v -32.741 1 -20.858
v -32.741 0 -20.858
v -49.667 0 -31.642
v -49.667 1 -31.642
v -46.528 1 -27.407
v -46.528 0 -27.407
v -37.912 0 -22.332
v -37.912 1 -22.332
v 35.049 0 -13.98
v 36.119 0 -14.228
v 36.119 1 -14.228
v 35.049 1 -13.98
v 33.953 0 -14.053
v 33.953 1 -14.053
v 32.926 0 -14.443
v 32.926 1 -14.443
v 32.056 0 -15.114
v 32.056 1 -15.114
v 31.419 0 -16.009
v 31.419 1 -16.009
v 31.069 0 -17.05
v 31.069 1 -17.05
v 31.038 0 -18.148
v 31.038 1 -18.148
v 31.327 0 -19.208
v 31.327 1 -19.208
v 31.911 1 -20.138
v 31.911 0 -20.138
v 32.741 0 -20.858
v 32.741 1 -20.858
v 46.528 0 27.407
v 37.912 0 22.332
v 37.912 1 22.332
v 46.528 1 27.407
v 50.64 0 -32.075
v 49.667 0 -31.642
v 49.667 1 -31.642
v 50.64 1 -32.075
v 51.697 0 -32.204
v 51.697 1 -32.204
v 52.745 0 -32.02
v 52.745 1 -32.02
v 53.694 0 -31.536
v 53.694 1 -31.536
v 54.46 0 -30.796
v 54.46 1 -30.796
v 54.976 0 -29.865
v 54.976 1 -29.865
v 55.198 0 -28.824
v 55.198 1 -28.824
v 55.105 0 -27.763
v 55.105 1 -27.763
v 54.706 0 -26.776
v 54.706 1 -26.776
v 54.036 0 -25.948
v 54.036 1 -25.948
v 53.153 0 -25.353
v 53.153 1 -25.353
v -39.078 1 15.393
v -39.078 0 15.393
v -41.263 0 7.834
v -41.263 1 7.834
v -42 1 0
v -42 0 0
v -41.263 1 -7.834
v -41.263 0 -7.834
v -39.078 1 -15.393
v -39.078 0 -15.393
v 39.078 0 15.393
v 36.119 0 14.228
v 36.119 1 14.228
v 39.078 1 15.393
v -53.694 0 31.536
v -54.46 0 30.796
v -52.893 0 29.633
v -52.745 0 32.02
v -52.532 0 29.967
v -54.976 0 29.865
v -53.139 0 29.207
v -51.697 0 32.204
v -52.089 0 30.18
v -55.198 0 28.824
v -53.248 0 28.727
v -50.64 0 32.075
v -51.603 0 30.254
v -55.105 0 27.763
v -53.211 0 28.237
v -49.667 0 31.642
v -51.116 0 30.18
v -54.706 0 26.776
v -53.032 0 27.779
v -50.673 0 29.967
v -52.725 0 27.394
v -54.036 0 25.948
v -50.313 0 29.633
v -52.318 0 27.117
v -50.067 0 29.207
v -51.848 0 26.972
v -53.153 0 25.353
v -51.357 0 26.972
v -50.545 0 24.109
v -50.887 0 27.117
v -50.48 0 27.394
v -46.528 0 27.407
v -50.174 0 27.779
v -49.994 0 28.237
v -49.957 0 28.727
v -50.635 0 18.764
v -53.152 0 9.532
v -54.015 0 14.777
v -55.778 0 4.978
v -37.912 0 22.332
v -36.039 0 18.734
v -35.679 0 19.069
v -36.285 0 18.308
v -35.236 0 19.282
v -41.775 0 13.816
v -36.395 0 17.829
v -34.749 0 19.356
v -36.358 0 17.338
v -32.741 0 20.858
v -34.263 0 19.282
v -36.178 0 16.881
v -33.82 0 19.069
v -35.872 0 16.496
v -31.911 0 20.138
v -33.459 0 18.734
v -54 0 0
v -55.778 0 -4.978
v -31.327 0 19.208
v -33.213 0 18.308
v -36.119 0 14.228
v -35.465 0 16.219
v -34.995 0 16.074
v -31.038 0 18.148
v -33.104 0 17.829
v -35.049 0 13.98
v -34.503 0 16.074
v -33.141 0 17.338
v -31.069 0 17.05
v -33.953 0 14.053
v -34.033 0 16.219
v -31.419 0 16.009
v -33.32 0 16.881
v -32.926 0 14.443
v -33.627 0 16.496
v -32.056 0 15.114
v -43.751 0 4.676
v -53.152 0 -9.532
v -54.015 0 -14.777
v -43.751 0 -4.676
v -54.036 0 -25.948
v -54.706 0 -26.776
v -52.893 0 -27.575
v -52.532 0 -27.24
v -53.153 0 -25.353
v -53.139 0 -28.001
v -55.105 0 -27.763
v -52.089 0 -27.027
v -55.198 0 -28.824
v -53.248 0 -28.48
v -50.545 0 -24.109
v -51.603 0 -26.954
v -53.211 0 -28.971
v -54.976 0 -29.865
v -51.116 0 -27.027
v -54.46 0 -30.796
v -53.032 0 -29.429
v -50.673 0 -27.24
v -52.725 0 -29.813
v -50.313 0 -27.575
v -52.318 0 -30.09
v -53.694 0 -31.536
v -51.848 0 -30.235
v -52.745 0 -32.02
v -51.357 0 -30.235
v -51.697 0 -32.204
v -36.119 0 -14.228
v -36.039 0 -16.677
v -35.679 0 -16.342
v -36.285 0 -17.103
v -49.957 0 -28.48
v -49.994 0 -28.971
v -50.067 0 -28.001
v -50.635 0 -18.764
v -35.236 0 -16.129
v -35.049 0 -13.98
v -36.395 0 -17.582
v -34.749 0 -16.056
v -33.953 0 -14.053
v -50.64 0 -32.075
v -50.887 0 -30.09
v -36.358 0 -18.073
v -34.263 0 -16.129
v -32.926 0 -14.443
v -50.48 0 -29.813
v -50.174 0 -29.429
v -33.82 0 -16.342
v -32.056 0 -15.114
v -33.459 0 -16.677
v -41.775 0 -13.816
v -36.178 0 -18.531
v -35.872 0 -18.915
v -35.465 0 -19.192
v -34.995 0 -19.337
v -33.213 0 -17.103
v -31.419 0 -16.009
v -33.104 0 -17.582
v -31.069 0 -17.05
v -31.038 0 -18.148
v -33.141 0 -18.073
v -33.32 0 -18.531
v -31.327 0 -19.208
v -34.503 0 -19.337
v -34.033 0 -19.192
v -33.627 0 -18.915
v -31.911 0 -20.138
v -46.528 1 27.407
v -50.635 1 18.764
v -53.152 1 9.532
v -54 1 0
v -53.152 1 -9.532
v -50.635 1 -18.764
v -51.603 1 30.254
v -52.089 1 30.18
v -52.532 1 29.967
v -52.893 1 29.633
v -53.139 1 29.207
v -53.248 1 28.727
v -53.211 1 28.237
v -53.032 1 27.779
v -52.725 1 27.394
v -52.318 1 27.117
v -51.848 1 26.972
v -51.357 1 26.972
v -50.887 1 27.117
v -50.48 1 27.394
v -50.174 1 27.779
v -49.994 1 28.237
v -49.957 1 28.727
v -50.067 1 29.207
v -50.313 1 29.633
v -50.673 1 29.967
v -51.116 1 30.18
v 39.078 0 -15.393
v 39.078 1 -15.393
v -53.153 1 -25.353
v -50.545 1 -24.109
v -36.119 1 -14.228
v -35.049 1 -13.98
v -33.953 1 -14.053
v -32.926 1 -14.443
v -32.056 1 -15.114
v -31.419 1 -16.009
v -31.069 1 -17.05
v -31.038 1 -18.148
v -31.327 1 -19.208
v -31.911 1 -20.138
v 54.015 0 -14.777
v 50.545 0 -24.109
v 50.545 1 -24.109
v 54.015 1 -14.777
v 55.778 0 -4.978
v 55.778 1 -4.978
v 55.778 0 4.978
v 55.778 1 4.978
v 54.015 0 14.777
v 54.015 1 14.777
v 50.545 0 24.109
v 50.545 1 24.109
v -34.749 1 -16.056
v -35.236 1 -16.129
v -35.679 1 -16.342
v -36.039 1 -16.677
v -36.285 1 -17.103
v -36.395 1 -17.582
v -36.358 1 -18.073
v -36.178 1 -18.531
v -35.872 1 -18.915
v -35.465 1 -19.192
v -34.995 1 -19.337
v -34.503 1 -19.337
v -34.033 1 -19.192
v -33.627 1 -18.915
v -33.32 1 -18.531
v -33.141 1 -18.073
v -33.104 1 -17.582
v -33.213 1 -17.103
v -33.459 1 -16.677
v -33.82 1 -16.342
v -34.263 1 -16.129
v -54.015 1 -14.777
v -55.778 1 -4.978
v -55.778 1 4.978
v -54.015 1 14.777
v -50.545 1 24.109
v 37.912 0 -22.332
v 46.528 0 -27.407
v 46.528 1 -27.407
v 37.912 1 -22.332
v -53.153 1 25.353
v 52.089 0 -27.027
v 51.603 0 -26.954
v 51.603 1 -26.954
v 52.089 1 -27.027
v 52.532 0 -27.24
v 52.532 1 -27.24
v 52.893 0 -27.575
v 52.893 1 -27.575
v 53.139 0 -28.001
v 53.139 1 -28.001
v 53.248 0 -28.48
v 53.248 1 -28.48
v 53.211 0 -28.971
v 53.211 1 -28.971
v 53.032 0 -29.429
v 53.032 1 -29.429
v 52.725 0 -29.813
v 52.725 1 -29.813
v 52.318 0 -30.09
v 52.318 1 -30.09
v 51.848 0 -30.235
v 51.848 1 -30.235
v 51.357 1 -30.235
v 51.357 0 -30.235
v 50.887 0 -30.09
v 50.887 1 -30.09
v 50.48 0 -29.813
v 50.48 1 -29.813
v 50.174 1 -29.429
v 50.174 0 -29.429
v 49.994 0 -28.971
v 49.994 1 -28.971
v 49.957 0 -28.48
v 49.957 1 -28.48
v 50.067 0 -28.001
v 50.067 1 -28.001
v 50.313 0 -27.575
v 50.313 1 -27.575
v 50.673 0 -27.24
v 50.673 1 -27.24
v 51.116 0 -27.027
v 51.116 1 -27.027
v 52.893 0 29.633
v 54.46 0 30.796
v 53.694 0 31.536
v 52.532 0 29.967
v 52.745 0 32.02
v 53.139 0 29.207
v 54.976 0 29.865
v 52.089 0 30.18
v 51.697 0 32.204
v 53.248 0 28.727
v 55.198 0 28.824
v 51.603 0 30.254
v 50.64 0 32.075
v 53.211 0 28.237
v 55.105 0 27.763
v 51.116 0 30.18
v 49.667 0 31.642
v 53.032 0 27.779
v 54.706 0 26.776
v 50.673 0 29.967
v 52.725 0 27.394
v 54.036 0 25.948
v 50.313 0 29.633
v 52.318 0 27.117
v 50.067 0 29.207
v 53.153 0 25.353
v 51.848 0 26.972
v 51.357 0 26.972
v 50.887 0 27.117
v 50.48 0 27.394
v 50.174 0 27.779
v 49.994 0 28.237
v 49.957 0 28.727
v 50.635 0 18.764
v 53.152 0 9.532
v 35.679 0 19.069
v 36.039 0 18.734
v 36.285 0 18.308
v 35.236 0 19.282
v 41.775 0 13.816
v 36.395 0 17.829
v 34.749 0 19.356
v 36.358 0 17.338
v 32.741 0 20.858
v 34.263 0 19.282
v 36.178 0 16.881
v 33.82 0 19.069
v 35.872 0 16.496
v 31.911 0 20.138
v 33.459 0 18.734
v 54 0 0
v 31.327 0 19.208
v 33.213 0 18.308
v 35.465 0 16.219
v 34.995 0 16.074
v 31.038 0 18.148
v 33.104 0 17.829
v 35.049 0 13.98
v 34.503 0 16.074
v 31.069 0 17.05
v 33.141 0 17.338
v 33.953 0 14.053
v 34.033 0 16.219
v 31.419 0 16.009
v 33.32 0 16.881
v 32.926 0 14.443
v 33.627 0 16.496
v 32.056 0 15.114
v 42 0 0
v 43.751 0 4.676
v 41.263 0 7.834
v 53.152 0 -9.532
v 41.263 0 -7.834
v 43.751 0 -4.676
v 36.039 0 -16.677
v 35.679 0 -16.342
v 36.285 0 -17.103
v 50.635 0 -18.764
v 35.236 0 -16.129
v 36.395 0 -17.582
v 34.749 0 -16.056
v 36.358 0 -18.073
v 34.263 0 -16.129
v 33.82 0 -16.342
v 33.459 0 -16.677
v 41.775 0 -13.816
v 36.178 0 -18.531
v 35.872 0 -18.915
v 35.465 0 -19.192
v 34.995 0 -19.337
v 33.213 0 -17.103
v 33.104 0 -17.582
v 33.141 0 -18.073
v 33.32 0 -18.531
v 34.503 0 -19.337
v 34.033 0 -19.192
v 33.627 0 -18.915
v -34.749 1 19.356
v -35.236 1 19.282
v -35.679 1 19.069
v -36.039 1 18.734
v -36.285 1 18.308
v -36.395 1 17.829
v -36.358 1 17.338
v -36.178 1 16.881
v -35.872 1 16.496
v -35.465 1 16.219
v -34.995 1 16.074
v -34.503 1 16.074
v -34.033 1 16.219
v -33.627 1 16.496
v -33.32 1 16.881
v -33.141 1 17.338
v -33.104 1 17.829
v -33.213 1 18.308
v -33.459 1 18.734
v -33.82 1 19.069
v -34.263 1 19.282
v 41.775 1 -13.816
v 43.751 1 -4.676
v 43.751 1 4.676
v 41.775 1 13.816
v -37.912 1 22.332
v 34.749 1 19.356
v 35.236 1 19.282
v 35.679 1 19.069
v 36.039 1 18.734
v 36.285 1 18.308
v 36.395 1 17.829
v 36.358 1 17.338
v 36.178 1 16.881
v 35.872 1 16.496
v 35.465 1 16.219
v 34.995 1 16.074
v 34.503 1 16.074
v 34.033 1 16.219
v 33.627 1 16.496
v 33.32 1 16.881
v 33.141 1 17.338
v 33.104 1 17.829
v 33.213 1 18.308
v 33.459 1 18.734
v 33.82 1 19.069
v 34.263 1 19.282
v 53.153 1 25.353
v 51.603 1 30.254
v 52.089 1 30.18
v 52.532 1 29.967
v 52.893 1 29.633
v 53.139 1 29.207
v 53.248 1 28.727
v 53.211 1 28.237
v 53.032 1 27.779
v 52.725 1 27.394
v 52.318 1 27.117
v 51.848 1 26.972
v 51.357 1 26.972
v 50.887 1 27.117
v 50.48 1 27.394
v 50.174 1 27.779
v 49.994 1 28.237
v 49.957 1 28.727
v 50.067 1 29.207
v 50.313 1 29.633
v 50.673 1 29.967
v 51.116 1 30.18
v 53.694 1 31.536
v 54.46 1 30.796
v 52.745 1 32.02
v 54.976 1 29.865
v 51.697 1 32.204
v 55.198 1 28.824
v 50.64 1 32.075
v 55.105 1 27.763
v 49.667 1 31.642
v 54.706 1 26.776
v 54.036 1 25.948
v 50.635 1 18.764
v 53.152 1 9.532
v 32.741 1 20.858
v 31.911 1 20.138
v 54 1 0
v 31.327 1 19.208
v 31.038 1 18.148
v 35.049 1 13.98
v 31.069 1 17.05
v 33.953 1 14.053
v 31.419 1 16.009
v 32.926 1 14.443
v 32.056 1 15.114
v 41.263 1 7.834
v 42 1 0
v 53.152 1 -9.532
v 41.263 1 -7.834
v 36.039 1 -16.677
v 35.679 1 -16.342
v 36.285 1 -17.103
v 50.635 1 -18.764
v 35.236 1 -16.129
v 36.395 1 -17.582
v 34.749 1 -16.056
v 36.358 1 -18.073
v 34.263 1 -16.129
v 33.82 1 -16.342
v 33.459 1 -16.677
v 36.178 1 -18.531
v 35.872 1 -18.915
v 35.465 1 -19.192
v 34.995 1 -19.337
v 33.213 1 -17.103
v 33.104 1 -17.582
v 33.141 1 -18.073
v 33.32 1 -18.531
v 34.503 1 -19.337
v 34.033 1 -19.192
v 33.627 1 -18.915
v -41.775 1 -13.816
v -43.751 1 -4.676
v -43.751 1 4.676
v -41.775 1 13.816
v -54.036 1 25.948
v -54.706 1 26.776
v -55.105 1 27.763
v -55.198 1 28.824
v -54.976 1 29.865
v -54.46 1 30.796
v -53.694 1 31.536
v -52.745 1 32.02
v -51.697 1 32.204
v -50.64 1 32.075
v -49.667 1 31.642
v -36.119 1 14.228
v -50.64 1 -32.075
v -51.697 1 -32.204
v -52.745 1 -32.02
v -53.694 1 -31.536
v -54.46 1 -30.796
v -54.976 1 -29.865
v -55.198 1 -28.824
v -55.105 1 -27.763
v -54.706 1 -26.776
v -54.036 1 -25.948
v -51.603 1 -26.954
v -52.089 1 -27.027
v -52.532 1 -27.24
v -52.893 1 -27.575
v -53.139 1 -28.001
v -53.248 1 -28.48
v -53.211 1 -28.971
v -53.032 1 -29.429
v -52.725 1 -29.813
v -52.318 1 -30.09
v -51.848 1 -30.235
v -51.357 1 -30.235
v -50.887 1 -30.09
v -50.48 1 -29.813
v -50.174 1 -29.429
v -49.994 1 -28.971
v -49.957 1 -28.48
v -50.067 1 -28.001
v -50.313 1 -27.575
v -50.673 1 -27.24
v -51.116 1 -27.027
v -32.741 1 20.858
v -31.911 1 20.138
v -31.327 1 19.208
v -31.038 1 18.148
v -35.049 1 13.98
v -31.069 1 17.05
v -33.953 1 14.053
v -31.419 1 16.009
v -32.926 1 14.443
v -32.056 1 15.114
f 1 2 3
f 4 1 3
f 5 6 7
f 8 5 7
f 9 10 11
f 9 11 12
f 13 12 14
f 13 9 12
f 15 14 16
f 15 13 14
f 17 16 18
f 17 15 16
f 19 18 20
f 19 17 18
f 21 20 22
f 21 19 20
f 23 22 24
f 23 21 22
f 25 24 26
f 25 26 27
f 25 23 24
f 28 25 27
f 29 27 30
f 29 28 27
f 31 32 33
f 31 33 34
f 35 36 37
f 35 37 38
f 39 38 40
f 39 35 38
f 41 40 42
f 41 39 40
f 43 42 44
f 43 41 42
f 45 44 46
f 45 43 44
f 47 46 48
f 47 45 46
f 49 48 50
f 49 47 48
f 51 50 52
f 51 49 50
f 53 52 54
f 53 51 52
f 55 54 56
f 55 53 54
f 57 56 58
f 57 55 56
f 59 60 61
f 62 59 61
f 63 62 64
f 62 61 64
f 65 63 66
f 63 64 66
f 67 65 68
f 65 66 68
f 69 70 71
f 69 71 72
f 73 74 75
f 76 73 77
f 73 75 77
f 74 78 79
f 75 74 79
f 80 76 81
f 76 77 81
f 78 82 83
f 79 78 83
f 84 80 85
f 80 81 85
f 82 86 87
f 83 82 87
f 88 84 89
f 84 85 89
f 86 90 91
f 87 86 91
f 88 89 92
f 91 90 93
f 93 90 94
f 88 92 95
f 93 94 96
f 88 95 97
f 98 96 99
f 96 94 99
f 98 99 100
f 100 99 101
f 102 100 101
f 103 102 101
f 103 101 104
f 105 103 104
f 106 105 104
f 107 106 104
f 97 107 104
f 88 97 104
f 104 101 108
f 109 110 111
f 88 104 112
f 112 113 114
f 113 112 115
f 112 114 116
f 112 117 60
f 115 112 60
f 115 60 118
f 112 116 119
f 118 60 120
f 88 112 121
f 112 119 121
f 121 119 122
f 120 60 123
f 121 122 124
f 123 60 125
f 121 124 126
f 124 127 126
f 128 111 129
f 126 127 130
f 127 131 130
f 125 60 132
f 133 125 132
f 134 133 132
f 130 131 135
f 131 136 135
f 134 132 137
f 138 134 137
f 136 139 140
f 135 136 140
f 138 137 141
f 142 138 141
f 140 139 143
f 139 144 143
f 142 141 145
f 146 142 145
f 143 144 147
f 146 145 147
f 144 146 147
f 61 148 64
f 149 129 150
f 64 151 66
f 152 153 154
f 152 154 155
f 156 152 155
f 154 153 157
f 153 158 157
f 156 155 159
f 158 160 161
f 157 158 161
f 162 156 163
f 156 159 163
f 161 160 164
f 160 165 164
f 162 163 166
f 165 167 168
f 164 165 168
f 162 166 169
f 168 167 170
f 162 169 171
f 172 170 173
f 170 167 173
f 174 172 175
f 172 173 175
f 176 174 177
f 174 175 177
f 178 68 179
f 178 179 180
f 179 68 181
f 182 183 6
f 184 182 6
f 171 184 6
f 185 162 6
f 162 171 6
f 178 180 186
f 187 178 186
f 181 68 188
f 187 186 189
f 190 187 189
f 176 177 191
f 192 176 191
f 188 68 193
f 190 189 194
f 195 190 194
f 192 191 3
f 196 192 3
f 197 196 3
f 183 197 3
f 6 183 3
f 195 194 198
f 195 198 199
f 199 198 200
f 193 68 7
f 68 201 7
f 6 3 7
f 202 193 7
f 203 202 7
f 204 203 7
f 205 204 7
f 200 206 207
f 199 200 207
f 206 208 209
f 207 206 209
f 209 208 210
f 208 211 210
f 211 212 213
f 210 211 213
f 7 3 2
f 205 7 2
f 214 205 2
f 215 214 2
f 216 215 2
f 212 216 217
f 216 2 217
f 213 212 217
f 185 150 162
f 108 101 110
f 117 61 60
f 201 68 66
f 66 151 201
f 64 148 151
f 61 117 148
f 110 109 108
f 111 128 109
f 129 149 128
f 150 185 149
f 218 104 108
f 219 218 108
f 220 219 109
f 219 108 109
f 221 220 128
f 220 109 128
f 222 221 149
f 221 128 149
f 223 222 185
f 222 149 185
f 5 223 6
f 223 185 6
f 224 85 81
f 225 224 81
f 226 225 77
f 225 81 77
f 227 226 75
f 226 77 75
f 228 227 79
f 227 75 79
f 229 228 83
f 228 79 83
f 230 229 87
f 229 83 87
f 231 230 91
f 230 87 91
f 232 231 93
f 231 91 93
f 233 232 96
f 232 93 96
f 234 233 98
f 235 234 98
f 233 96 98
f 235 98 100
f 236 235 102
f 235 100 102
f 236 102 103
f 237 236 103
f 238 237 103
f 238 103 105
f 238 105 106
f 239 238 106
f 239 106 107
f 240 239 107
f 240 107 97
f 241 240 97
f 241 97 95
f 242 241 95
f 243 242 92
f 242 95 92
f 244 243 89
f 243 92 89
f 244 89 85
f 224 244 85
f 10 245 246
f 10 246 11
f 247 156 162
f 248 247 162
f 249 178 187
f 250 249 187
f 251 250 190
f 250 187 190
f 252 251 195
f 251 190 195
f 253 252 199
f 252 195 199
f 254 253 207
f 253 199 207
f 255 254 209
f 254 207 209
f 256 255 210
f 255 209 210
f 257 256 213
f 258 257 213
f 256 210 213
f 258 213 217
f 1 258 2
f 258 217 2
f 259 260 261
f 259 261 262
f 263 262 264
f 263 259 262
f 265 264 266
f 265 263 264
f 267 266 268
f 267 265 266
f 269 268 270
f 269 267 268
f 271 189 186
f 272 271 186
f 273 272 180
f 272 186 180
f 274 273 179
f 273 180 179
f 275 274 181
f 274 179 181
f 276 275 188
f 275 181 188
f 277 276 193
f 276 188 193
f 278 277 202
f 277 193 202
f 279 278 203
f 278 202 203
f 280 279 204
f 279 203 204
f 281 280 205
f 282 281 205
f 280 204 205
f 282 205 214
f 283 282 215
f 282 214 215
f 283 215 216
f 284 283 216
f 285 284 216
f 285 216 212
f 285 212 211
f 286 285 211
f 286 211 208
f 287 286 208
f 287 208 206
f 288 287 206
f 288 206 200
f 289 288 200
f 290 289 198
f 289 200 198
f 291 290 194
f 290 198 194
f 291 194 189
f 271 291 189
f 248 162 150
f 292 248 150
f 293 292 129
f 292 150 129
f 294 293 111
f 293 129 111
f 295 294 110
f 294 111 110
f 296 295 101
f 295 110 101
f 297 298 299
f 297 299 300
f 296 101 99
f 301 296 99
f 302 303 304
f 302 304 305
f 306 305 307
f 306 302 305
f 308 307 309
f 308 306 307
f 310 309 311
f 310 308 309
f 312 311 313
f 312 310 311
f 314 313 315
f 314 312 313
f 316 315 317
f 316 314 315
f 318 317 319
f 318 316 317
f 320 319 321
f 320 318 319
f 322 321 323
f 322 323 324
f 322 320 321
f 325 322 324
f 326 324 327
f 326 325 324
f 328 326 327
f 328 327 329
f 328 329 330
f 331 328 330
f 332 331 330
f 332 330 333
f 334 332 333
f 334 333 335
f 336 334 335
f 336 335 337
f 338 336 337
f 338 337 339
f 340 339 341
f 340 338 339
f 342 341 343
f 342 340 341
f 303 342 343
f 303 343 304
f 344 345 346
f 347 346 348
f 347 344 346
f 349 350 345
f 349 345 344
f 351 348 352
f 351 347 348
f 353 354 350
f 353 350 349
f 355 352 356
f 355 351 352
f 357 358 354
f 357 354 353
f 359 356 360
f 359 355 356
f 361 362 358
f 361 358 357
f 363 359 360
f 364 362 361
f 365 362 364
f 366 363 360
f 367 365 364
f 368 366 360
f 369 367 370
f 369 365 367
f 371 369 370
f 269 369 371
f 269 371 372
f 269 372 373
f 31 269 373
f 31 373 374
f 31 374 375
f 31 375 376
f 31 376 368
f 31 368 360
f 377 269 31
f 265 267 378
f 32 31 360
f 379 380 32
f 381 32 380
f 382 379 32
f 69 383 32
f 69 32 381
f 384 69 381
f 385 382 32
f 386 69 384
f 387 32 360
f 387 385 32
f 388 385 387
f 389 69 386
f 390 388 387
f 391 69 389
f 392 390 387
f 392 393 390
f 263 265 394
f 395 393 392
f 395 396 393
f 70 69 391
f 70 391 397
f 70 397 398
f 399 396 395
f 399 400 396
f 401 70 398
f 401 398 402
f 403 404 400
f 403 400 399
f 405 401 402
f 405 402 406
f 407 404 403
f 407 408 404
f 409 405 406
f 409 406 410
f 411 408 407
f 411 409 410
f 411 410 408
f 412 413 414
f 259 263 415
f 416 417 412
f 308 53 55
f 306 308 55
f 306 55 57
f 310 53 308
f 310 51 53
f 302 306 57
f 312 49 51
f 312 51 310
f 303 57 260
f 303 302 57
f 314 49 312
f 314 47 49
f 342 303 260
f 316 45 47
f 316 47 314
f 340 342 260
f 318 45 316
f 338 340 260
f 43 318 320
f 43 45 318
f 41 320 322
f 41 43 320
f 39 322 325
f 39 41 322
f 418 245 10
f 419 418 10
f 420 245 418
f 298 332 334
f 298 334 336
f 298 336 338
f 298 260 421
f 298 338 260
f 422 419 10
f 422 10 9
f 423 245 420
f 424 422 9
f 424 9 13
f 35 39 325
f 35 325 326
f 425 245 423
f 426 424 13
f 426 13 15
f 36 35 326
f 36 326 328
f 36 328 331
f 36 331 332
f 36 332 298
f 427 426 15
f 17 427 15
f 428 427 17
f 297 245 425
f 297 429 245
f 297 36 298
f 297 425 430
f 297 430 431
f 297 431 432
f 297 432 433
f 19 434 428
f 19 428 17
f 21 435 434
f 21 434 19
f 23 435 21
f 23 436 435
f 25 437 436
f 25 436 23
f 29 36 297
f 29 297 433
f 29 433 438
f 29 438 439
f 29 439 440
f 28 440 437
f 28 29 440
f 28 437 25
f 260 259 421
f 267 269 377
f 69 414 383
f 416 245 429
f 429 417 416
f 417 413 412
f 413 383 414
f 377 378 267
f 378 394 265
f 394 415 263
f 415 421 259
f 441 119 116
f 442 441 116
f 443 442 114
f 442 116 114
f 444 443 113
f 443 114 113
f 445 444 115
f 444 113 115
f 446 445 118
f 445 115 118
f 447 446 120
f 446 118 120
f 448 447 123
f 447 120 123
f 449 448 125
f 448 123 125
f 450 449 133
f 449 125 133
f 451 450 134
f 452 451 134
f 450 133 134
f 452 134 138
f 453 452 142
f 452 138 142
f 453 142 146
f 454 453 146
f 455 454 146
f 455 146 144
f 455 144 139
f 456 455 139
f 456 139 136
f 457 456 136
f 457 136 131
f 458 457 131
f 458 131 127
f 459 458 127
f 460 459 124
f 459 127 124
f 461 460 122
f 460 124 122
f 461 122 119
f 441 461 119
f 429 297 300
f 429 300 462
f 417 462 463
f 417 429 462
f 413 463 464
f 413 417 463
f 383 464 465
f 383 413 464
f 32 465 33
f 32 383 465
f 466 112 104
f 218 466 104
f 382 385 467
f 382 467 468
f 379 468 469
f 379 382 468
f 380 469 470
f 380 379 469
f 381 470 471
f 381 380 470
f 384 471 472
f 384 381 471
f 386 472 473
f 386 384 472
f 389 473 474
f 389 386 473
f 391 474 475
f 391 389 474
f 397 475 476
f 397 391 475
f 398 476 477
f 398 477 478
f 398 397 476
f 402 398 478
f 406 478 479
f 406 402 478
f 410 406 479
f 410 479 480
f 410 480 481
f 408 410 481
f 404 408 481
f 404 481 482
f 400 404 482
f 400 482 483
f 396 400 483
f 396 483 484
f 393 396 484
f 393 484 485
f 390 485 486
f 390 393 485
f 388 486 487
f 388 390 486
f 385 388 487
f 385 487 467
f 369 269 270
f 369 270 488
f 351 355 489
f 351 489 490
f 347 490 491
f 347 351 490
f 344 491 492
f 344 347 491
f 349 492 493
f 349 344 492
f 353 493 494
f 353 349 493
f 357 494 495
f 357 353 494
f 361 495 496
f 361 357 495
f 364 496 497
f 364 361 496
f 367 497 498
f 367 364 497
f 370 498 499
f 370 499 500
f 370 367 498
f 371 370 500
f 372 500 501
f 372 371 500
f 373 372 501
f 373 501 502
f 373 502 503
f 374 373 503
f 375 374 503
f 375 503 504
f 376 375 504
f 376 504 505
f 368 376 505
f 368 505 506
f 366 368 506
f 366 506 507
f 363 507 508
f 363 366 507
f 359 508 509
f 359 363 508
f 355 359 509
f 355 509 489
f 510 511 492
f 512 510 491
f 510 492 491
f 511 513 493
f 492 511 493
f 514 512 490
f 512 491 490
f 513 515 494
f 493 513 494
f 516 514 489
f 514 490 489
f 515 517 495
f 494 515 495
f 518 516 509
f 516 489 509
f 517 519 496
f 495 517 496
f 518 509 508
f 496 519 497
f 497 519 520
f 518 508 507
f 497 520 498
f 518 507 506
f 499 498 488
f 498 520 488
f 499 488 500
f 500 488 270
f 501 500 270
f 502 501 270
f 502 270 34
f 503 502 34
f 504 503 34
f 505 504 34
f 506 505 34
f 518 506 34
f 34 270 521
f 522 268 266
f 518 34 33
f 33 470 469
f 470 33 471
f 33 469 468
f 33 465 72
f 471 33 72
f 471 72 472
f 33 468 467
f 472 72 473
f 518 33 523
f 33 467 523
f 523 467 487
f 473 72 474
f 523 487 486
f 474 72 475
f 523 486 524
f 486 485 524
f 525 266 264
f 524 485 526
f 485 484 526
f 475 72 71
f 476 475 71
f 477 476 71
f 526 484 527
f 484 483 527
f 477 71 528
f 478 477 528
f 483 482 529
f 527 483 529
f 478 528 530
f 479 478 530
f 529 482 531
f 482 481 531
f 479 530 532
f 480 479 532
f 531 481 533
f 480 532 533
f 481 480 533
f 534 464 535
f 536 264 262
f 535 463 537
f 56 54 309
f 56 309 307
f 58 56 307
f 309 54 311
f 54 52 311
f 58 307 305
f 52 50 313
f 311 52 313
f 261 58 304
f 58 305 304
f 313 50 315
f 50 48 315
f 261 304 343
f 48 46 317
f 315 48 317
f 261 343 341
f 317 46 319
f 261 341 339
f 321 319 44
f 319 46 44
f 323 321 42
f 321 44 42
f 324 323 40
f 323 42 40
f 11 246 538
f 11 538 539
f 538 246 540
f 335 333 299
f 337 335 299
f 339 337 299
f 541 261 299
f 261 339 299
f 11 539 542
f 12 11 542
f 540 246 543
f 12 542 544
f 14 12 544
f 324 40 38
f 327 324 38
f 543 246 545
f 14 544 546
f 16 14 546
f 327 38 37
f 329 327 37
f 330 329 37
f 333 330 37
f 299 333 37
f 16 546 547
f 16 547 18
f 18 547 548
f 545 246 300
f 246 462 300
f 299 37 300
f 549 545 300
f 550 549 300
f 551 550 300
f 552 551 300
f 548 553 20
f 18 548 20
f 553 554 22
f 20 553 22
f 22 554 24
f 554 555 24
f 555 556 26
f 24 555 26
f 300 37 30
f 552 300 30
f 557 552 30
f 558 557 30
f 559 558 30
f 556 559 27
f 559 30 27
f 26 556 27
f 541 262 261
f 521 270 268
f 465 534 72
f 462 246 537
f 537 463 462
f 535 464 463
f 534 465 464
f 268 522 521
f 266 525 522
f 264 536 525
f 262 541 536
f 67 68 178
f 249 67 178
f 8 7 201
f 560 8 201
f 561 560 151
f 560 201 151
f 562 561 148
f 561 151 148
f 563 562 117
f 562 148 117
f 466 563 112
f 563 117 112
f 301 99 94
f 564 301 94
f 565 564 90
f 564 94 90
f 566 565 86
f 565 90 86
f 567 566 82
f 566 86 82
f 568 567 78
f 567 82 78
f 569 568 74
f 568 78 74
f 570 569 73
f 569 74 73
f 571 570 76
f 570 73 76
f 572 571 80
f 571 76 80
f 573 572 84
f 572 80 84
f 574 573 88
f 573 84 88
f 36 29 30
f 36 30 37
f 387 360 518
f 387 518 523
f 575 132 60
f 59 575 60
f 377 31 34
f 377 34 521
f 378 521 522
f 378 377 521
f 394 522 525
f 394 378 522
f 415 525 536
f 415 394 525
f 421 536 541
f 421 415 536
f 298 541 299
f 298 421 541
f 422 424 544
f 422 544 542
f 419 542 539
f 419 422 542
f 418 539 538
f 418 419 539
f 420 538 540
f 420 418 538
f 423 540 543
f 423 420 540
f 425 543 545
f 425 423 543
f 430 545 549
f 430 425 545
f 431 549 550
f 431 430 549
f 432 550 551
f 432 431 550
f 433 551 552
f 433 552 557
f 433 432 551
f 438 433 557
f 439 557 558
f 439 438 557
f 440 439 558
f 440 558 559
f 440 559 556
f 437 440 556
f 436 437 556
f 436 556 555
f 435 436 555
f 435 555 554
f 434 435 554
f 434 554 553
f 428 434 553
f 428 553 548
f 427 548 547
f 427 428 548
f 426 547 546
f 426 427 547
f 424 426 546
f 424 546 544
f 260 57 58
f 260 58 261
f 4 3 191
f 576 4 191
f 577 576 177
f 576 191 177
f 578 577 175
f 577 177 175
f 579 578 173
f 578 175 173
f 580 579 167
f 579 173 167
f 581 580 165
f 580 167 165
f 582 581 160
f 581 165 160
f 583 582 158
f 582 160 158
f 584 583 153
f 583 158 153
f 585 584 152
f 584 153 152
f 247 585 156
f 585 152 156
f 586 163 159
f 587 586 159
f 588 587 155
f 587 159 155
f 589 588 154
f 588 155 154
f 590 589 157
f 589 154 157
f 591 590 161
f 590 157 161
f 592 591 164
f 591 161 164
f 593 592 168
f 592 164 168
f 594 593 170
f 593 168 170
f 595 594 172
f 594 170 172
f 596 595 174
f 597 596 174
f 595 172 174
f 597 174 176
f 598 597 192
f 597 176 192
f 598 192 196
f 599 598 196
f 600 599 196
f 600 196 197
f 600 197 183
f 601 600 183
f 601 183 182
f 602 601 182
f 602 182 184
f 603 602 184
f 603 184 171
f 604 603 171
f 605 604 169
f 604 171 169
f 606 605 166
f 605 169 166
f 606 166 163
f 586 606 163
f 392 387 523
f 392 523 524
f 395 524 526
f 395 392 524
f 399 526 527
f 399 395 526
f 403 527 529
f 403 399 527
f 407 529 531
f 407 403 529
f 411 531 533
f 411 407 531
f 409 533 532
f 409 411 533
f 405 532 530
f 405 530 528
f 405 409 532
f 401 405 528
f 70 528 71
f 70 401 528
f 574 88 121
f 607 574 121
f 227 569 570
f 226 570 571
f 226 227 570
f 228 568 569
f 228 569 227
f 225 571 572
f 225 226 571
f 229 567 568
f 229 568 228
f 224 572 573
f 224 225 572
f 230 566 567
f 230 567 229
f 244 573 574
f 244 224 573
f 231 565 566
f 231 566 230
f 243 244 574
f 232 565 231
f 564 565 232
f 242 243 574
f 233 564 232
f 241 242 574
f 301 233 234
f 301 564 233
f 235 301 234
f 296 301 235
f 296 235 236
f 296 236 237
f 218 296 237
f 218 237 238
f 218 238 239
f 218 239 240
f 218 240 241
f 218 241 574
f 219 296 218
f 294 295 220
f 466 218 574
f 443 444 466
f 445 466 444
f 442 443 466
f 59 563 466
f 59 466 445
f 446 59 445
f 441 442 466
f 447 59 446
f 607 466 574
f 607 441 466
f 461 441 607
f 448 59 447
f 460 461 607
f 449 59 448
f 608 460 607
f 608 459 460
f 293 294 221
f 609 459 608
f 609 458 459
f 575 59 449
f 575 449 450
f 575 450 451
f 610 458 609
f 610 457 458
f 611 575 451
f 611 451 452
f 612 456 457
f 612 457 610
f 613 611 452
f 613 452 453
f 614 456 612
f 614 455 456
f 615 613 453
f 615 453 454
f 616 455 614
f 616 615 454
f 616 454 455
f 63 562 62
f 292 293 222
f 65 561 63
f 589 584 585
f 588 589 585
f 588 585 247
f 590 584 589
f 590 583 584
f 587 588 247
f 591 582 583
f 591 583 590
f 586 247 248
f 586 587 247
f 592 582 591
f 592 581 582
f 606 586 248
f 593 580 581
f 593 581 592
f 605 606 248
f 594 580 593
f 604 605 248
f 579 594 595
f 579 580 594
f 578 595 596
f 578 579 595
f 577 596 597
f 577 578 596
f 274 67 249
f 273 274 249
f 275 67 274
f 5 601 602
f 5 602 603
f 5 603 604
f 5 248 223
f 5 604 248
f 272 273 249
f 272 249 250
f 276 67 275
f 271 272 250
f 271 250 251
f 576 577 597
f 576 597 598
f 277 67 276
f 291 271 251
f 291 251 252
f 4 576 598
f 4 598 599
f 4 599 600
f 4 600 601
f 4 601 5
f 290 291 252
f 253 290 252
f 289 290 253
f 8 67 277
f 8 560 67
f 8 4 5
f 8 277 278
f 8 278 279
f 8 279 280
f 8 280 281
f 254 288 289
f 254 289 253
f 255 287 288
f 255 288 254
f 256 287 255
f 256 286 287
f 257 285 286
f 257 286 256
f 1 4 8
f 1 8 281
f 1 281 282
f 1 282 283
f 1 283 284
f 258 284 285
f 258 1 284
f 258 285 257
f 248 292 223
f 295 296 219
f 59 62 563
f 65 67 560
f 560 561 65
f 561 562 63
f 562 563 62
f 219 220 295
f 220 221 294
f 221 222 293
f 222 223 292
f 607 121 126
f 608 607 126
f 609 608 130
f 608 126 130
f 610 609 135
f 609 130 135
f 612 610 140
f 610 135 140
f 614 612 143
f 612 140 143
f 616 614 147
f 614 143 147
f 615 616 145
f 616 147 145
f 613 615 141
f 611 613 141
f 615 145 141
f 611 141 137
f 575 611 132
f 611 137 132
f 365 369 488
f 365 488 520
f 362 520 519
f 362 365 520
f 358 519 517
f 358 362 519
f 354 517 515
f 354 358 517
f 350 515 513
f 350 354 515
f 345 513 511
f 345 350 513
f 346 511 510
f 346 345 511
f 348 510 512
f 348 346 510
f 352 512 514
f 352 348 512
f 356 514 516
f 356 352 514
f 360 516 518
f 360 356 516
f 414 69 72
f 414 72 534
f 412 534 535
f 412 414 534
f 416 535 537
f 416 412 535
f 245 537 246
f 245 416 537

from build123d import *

# Parameters (mm, degrees)
SKETCH1_R           = 1.65
BOSS_EXTRUDE1_DEPTH = 1


with BuildPart() as part:
    # Sketch1 → Boss-Extrude1 (new body)
    with BuildSketch(Plane(origin=(0, 0, 0), x_dir=(1, 0, 0), z_dir=(0, 1, 0))):
        with BuildLine():
            Line((50.544775924, 24.108621421), (53.15320507, 25.352778303))
            ThreePointArc((53.15320507, 25.352778303), (54.752823812, 30.349985831), (49.667282695, 31.64154874))
            Line((49.667282695, 31.64154874), (32.740836917, 20.858213514))
            ThreePointArc((32.740836917, 20.858213514), (31.418686002, 16.008620108), (36.119230292, 14.227743183))
            Line((36.119230292, 14.227743183), (39.077537855, 15.393051522))
            ThreePointArc((39.077537855, 15.393051522), (42, 0), (39.077537855, -15.393051522))
            Line((39.077537855, -15.393051522), (36.119230292, -14.227743183))
            ThreePointArc((36.119230292, -14.227743183), (31.418686002, -16.008620108), (32.740836917, -20.858213514))
            Line((32.740836917, -20.858213514), (49.667282695, -31.64154874))
            ThreePointArc((49.667282695, -31.64154874), (54.752823812, -30.349985831), (53.15320507, -25.352778303))
            Line((53.15320507, -25.352778303), (50.544775924, -24.108621421))
            ThreePointArc((50.544775924, -24.108621421), (56, 0), (50.544775924, 24.108621421))
        make_face()
        with Locations((34.749254443, -17.70562949)):
            Circle(SKETCH1_R, mode=Mode.SUBTRACT)
        with Locations((51.602562721, -28.603767595)):
            Circle(SKETCH1_R, mode=Mode.SUBTRACT)
        with BuildLine():
            Line((46.527974664, -27.4070716), (37.911683059, -22.33168797))
            ThreePointArc((37.911683059, -22.33168797), (44, 0), (37.911683059, 22.33168797))
            Line((37.911683059, 22.33168797), (46.527974664, 27.4070716))
            ThreePointArc((46.527974664, 27.4070716), (54, 0), (46.527974664, -27.4070716))
        make_face(mode=Mode.SUBTRACT)
        with Locations((34.749254443, 17.70562949)):
            Circle(SKETCH1_R, mode=Mode.SUBTRACT)
        with Locations((51.602562721, 28.603767595)):
            Circle(SKETCH1_R, mode=Mode.SUBTRACT)
    extrude(amount=BOSS_EXTRUDE1_DEPTH)


with BuildPart() as body_2:
    # Mirror2: mirrored copy
    add(part.part.mirror(Plane(origin=(0, 0, 0), x_dir=(0, 0, 1), z_dir=(1, 0, 0))))


solid = Compound([part.part, body_2.part])
